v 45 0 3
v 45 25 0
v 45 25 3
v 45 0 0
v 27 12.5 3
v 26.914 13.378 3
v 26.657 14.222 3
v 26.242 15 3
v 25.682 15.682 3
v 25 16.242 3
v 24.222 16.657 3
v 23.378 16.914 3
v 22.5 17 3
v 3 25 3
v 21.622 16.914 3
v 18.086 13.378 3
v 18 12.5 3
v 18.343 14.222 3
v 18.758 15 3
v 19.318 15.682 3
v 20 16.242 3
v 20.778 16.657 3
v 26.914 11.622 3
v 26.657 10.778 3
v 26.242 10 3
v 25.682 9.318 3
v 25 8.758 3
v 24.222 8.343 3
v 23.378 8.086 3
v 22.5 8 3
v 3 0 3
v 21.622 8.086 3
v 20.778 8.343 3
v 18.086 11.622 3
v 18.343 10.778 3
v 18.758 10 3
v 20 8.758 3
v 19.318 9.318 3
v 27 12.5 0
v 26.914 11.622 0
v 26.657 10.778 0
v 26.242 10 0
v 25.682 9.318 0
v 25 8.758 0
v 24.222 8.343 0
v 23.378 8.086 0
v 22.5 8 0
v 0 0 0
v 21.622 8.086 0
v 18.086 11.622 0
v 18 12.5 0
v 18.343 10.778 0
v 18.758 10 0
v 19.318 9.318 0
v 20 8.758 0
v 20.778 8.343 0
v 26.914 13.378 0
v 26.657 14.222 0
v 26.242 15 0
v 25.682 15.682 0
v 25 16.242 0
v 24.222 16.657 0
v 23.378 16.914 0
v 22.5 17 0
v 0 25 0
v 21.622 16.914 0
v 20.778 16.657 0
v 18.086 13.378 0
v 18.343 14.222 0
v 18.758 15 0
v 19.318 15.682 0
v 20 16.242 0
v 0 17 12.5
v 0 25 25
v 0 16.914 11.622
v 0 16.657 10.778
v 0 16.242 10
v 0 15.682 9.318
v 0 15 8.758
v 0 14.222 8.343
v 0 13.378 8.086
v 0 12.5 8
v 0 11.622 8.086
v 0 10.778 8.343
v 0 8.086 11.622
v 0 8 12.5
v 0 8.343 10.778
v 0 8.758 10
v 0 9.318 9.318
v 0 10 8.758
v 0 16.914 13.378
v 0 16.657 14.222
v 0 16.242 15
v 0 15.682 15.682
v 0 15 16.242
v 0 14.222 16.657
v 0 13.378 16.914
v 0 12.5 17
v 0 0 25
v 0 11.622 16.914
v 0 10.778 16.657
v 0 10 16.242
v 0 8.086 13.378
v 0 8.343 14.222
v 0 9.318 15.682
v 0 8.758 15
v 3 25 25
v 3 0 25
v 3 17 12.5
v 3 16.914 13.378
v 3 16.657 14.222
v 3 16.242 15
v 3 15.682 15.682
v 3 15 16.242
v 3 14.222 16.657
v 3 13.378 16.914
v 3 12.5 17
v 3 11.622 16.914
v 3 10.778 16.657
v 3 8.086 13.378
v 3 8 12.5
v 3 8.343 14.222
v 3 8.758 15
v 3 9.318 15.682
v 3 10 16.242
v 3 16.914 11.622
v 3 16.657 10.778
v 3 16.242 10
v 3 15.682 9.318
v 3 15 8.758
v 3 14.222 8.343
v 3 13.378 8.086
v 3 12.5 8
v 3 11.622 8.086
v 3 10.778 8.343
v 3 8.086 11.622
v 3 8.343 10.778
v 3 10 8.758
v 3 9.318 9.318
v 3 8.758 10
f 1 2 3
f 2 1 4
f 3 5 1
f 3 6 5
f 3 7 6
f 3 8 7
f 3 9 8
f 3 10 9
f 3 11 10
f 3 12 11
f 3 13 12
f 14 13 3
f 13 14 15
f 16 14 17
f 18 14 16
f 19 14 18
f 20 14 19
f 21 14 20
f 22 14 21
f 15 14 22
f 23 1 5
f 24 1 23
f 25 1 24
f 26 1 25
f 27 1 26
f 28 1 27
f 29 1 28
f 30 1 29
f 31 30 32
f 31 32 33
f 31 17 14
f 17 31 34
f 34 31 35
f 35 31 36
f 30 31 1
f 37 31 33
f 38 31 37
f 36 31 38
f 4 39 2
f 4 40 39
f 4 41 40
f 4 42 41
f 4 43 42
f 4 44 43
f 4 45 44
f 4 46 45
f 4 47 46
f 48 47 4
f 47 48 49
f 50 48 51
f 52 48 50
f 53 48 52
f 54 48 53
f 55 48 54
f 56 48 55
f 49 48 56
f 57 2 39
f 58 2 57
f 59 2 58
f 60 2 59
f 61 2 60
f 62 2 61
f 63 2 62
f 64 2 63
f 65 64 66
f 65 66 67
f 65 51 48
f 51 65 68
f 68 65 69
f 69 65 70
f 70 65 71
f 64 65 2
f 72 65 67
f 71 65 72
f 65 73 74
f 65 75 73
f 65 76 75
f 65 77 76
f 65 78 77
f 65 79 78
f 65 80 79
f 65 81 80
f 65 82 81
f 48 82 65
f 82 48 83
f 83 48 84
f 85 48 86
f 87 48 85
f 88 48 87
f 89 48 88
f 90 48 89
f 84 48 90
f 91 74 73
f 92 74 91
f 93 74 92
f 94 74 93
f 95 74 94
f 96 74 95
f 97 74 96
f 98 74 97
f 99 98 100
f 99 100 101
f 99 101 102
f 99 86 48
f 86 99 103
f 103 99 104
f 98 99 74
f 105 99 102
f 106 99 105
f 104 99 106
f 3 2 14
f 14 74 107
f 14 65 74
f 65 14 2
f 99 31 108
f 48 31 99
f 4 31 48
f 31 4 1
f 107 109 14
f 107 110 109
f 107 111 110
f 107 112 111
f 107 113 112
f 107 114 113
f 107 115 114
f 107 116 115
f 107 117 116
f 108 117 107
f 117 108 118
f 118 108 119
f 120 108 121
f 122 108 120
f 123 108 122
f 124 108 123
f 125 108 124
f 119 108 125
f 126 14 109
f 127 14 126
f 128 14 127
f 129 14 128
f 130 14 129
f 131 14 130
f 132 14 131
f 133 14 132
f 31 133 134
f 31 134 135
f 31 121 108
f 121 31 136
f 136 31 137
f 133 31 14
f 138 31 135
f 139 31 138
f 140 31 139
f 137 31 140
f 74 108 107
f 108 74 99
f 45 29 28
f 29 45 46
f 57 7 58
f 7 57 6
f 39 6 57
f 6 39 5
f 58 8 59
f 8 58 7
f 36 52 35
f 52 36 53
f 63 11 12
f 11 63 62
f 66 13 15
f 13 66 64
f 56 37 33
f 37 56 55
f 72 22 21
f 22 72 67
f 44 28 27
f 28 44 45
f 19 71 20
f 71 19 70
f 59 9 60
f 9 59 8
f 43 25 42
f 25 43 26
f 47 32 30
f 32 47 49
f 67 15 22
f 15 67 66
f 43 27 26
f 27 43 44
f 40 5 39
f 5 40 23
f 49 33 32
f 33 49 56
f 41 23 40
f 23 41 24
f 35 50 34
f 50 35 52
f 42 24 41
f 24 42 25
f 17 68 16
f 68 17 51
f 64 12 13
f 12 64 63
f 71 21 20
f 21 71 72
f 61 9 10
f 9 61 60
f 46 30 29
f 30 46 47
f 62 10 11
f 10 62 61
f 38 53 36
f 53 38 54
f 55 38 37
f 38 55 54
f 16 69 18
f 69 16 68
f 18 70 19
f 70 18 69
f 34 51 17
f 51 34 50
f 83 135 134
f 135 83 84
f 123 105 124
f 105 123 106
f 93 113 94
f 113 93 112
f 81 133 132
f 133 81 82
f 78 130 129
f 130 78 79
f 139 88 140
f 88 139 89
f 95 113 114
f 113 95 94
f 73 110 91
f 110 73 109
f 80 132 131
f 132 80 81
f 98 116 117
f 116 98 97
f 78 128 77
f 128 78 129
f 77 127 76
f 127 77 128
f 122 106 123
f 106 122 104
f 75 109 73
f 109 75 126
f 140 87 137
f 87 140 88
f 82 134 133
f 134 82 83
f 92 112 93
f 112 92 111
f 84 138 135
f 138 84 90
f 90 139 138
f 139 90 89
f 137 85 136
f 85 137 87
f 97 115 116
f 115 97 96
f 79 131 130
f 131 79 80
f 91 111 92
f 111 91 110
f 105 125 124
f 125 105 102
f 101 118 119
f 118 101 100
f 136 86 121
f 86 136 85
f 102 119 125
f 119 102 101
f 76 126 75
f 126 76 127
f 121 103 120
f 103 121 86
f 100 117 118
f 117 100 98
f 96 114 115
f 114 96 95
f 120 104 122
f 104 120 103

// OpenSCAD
$fn = 32;

// ----------------------------------------------------------------------
// L-bracket: 45 x 25 x 25 mm
// ----------------------------------------------------------------------

// --- parameters (mm) ---
run_out = 45;             // horizontal leg, X
rise = 25;                // vertical leg, Z
bracket_w = 25;           // bracket depth, Y
sheet_t = 3;              // plate thickness
hole_d = 9;               // clearance for M8

module hole_z(px, py) {
  translate([px, py, -2.5]) cylinder(h = sheet_t + 5, d = hole_d);
}
module hole_x(pz, py) {
  translate([-2.5, py, pz]) rotate([0, 90, 0]) cylinder(h = sheet_t + 5, d = hole_d);
}

difference() {
  union() {
    /* horizontal leg */
    cube([run_out, bracket_w, sheet_t]);
    /* vertical leg, overlapping the corner block */
    cube([sheet_t, bracket_w, rise]);
  }
  hole_z(22.5, 12.5);
  hole_x(12.5, 12.5);
}
